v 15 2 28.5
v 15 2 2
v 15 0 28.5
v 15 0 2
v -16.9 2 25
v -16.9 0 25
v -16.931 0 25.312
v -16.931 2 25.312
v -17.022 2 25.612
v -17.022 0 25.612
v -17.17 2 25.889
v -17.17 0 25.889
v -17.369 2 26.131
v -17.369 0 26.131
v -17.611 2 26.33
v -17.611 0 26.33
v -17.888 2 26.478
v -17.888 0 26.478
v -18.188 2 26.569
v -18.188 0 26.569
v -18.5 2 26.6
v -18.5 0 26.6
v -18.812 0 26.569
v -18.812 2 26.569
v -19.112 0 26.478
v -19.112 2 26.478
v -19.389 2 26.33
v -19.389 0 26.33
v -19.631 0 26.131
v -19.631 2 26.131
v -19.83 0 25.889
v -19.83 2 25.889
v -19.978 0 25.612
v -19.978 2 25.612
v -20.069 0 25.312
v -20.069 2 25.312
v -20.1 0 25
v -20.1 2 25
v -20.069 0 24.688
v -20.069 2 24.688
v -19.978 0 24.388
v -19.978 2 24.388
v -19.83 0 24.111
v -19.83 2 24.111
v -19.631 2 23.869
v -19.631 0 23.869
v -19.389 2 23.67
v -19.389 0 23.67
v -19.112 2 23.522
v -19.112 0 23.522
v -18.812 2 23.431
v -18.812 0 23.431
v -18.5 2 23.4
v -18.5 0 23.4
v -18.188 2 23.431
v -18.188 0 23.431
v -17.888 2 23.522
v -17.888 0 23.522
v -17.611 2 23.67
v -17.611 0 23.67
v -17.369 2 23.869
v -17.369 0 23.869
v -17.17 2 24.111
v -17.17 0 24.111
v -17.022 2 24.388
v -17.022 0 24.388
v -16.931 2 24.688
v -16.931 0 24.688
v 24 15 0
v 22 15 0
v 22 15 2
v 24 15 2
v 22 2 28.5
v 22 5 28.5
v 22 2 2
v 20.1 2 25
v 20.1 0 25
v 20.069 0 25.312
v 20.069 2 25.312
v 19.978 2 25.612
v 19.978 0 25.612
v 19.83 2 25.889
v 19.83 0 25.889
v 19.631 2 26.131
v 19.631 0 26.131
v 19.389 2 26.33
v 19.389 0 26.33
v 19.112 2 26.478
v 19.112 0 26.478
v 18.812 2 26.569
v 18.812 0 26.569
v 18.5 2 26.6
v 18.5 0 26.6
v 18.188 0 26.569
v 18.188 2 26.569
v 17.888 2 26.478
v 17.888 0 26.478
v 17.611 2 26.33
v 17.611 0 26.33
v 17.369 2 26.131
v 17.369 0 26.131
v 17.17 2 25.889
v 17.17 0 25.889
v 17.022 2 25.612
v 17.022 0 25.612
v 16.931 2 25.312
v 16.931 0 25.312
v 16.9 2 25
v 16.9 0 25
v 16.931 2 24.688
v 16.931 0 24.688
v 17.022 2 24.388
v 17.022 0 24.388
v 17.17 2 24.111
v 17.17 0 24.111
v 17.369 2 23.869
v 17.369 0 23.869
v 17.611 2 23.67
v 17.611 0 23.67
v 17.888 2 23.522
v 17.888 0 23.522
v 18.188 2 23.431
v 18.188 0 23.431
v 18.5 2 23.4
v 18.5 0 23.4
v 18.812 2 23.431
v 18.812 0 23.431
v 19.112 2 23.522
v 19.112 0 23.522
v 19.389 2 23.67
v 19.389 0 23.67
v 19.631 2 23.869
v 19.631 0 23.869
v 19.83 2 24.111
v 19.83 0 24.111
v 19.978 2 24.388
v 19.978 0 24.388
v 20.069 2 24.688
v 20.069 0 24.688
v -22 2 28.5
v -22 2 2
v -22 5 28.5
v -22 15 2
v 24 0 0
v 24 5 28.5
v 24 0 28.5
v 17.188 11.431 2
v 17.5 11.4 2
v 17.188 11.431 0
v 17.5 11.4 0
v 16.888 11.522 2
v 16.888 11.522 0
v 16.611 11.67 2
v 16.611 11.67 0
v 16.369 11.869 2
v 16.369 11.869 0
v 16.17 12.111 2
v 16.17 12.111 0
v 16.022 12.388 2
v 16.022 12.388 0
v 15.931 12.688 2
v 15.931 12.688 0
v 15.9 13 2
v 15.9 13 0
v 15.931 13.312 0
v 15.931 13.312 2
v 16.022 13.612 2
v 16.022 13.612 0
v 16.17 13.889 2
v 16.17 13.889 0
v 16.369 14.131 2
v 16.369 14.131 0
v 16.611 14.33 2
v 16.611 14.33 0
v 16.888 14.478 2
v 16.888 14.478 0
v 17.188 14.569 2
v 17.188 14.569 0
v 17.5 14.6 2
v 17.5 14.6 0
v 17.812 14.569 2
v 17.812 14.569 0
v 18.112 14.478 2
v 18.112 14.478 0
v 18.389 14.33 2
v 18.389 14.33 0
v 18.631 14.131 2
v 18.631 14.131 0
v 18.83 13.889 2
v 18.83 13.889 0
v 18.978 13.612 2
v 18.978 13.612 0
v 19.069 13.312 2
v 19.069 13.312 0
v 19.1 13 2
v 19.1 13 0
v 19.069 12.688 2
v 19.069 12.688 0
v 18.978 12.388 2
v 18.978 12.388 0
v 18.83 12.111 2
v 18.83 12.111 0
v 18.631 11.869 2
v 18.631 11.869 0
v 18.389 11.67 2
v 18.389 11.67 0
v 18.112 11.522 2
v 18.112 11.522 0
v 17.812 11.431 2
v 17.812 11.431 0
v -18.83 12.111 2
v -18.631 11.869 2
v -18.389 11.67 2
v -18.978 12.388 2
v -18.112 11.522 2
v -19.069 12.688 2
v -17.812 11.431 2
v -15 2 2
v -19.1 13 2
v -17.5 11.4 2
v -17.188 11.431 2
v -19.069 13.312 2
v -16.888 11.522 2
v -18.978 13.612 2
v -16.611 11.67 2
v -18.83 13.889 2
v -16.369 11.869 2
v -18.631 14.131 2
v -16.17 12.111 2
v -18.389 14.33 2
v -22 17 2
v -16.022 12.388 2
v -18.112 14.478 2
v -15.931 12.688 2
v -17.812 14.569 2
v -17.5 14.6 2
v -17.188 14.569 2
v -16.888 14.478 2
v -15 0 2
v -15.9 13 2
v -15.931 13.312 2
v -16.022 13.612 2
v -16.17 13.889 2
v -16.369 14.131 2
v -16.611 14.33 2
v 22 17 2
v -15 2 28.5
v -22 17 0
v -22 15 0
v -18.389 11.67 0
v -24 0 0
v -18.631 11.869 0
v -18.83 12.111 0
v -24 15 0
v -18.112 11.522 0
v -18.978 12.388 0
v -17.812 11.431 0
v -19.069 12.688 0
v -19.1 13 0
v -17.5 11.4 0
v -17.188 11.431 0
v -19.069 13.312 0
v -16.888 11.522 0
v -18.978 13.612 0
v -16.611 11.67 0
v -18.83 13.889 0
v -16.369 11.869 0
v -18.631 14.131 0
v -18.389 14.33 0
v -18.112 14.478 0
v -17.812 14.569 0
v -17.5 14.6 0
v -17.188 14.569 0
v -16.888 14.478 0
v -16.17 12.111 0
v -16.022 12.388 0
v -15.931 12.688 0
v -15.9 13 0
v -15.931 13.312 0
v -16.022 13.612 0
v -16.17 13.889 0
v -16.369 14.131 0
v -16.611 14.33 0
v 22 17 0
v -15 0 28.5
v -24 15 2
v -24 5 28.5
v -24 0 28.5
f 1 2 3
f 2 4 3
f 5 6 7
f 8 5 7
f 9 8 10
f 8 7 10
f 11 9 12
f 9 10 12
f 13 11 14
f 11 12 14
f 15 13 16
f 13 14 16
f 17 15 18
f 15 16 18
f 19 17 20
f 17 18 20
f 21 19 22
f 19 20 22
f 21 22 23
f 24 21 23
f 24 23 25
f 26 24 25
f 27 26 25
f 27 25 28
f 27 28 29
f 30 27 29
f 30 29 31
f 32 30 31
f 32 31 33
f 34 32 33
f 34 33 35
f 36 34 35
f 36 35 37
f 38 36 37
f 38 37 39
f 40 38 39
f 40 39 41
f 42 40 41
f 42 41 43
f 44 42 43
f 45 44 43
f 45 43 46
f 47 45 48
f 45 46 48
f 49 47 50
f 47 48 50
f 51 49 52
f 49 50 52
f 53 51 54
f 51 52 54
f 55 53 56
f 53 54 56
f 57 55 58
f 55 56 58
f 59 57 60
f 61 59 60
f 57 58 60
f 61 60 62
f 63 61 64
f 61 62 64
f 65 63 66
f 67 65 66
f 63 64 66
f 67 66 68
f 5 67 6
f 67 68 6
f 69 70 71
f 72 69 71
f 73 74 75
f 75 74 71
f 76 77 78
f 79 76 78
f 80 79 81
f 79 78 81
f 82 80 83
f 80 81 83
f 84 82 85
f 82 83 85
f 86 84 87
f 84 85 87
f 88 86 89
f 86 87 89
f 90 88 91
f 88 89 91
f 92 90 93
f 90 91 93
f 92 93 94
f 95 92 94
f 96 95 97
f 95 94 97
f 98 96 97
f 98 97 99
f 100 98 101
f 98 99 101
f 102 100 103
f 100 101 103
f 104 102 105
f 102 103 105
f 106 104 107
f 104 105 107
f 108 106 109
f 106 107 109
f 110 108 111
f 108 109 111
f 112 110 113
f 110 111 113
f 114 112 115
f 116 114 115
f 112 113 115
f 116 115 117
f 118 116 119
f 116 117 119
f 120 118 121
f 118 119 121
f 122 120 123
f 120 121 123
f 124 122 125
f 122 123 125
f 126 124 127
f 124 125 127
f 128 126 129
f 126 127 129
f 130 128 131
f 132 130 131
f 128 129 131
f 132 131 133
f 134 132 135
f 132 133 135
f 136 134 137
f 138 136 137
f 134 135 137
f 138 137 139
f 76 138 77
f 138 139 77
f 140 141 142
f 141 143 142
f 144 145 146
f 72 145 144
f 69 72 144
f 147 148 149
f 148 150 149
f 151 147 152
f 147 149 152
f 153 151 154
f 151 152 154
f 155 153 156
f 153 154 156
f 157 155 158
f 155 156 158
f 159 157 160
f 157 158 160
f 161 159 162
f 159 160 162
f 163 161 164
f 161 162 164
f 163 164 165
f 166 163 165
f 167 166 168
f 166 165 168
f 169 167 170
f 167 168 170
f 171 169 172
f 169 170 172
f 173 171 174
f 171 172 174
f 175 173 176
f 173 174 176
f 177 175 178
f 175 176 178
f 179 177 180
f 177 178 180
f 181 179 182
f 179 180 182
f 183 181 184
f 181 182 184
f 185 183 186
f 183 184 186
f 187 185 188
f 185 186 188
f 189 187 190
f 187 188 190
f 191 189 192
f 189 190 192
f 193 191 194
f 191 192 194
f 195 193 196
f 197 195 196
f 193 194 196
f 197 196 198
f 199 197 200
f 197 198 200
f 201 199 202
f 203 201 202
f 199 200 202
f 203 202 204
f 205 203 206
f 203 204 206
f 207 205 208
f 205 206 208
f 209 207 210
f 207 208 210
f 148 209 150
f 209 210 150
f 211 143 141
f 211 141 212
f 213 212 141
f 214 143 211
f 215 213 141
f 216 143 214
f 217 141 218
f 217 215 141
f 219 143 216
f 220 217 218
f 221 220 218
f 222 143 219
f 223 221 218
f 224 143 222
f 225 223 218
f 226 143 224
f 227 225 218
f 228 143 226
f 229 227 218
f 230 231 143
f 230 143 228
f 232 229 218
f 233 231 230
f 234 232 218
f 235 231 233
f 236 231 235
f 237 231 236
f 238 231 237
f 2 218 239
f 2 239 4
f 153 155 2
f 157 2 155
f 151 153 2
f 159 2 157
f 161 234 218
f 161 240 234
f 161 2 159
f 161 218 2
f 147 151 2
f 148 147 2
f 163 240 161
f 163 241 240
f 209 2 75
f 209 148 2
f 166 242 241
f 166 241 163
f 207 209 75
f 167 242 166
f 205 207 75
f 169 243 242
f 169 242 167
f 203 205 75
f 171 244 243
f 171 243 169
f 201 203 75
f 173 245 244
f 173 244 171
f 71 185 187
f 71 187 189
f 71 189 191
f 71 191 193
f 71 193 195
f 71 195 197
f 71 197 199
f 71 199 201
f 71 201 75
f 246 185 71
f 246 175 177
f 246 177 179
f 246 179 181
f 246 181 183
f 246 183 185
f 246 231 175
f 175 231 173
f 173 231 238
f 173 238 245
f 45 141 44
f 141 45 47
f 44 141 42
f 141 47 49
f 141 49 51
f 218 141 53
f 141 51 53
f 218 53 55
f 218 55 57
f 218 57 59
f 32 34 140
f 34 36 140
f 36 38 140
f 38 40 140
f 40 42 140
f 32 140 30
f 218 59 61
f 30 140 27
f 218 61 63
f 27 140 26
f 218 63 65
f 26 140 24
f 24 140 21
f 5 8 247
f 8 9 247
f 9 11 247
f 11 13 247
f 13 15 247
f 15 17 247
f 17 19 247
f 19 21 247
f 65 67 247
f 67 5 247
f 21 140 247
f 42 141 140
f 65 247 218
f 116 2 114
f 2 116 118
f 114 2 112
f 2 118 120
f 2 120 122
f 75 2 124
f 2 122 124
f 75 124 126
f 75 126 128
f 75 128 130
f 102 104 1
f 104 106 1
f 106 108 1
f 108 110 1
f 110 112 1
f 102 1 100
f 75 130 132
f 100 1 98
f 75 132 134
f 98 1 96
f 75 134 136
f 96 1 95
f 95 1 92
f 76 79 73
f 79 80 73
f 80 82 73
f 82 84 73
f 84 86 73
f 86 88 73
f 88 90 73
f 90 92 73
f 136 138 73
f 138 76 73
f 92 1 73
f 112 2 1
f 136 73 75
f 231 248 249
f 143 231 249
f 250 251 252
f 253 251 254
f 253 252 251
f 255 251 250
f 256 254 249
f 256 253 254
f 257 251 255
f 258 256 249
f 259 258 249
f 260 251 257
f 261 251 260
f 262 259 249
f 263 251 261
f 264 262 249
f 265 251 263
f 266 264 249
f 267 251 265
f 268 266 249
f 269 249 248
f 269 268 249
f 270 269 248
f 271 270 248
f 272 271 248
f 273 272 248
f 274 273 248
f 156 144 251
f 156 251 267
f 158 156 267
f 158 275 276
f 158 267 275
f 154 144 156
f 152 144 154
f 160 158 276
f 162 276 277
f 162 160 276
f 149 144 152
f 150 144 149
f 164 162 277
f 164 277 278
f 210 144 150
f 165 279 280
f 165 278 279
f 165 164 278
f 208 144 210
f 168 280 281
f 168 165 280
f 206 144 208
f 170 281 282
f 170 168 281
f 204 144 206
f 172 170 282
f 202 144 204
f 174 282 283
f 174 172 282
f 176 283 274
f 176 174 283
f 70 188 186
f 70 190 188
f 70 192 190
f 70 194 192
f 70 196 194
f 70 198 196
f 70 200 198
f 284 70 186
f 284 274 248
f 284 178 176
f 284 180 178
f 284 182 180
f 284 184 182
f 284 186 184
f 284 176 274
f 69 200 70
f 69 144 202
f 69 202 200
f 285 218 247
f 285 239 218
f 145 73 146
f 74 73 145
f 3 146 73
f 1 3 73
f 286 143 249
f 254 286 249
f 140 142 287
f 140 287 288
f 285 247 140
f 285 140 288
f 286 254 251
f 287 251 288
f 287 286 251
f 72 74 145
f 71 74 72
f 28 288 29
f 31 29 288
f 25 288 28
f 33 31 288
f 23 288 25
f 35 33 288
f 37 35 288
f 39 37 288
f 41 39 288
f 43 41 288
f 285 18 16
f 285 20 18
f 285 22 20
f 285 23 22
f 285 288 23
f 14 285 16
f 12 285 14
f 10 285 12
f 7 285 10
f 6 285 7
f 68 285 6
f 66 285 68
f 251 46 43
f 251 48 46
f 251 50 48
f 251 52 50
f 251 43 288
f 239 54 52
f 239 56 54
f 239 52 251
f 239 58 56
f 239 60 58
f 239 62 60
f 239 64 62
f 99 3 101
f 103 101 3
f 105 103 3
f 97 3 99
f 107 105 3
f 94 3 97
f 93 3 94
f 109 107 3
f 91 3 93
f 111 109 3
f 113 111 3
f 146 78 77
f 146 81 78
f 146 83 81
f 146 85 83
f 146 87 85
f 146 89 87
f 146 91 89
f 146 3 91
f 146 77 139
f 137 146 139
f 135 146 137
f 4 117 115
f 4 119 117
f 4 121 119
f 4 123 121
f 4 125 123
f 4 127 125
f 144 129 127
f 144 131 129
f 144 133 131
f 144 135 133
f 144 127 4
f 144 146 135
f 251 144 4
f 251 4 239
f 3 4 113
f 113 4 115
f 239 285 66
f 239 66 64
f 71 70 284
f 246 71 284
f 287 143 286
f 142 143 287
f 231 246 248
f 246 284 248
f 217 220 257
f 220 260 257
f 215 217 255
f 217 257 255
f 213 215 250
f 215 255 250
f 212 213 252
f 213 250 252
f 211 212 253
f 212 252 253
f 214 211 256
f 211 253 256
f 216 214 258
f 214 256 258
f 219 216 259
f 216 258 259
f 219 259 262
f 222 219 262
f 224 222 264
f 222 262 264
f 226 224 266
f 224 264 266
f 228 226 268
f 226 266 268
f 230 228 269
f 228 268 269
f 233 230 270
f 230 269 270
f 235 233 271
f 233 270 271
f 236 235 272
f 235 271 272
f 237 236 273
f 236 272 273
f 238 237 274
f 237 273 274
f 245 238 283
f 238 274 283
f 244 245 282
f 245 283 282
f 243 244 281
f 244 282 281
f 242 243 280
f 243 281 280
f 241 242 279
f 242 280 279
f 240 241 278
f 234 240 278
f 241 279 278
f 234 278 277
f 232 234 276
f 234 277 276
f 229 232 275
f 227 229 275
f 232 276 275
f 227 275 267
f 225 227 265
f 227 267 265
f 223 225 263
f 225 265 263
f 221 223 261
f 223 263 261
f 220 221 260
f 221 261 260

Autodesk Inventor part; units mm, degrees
ref_plane "YZ Plane" through (0, 0, 0) normal (1, 0, 0) x (0, 1, 0)
ref_plane "XZ Plane" through (0, 0, 0) normal (0, 1, 0) x (-1, 0, 0)
ref_plane "XY Plane" through (0, 0, 0) normal (0, 0, 1) x (1, 0, 0)
sketch "スケッチ1" plane through (0, 0, 0) normal (0, 0, 1) x (1, 0, 0)
  line L0 (-22, 0) -> (22, 0)
  line L1 (22, 0) -> (22, 17)
  line L2 (22, 17) -> (-22, 17)
  line L3 (-22, 17) -> (-22, 0)
  point P0 (0, 0)
  point P1 (0, 0)
  dimension "d0" = 44
  dimension "d1" = 17
extrude "土台" add sketch "スケッチ1" along normal blind 2
sketch "スケッチ2" plane through (-22, 0, 0) normal (0, -1, 0) x (1, 0, 0)
  line L0 (22, 0) -> (22, 53.3234) construction
  circle A0 centre (22, 25) radius 15 construction
  line L1 (0, 2) -> (44, 2) construction
  line L2 (-7.4711, 25) -> (51.4711, 25) construction
  circle A1 centre (3.5, 25) radius 1.6
  circle A2 centre (40.5, 25) radius 1.6
  line L3 (0, 2) -> (7, 2)
  line L4 (7, 2) -> (7, 28.5)
  line L5 (7, 28.5) -> (0, 28.5)
  line L6 (0, 28.5) -> (0, 2)
  line L7 (44, 2) -> (37, 2)
  line L8 (37, 2) -> (37, 28.5)
  line L9 (37, 28.5) -> (44, 28.5)
  line L10 (44, 28.5) -> (44, 2)
  dimension "d4" = 30
  dimension "d5" = 23
  dimension "d6" = 3.2
  dimension "d7" = 37
  dimension "d8" = 3.5
extrude "モータ支柱" add sketch "スケッチ2" against normal blind 2
sketch "スケッチ3" plane through (22, 0, 0) normal (1, 0, 0) x (0, 0, -1)
  line L0 (-28.5, 0) -> (-28.5, 2) projected
  line L1 (-28.5, 0) -> (-28.5, 5)
  line L2 (-28.5, 5) -> (-2, 15)
  line L3 (-2, 17) -> (-2, 2) projected
  line L4 (0, 17) -> (0, 0) projected
  line L5 (0, 15) -> (-2, 15)
  line L6 (0, 0) -> (-28.5, 0) projected
  dimension "d11" = 5
  dimension "d12" = 15
extrude "補強リブ" add sketch "スケッチ3" along normal blind 2
mirror "ミラー1" about plane through (0, 0, 0) normal (1, 0, 0) of "補強リブ"
sketch "スケッチ4" plane through (0, 0, 2) normal (0, 0, 1) x (1, 0, 0)
  line L0 (0, 0) -> (0, 42.8792) construction
  line L1 (-15, 0) -> (15, 0) construction
  line L2 (22, 17) -> (-22, 17) projected
  point P0 (-17.5, 13)
  point P1 (17.5, 13)
  point P2 (0, 0)
  dimension "d15" = 35
  dimension "d24" = 4
hole "穴1" at (-17.5, 13, 2) at (17.5, 13, 2) direction (0, 0, -1) diameter 3.2 end through all
properties part number "SPG27_Braket"
